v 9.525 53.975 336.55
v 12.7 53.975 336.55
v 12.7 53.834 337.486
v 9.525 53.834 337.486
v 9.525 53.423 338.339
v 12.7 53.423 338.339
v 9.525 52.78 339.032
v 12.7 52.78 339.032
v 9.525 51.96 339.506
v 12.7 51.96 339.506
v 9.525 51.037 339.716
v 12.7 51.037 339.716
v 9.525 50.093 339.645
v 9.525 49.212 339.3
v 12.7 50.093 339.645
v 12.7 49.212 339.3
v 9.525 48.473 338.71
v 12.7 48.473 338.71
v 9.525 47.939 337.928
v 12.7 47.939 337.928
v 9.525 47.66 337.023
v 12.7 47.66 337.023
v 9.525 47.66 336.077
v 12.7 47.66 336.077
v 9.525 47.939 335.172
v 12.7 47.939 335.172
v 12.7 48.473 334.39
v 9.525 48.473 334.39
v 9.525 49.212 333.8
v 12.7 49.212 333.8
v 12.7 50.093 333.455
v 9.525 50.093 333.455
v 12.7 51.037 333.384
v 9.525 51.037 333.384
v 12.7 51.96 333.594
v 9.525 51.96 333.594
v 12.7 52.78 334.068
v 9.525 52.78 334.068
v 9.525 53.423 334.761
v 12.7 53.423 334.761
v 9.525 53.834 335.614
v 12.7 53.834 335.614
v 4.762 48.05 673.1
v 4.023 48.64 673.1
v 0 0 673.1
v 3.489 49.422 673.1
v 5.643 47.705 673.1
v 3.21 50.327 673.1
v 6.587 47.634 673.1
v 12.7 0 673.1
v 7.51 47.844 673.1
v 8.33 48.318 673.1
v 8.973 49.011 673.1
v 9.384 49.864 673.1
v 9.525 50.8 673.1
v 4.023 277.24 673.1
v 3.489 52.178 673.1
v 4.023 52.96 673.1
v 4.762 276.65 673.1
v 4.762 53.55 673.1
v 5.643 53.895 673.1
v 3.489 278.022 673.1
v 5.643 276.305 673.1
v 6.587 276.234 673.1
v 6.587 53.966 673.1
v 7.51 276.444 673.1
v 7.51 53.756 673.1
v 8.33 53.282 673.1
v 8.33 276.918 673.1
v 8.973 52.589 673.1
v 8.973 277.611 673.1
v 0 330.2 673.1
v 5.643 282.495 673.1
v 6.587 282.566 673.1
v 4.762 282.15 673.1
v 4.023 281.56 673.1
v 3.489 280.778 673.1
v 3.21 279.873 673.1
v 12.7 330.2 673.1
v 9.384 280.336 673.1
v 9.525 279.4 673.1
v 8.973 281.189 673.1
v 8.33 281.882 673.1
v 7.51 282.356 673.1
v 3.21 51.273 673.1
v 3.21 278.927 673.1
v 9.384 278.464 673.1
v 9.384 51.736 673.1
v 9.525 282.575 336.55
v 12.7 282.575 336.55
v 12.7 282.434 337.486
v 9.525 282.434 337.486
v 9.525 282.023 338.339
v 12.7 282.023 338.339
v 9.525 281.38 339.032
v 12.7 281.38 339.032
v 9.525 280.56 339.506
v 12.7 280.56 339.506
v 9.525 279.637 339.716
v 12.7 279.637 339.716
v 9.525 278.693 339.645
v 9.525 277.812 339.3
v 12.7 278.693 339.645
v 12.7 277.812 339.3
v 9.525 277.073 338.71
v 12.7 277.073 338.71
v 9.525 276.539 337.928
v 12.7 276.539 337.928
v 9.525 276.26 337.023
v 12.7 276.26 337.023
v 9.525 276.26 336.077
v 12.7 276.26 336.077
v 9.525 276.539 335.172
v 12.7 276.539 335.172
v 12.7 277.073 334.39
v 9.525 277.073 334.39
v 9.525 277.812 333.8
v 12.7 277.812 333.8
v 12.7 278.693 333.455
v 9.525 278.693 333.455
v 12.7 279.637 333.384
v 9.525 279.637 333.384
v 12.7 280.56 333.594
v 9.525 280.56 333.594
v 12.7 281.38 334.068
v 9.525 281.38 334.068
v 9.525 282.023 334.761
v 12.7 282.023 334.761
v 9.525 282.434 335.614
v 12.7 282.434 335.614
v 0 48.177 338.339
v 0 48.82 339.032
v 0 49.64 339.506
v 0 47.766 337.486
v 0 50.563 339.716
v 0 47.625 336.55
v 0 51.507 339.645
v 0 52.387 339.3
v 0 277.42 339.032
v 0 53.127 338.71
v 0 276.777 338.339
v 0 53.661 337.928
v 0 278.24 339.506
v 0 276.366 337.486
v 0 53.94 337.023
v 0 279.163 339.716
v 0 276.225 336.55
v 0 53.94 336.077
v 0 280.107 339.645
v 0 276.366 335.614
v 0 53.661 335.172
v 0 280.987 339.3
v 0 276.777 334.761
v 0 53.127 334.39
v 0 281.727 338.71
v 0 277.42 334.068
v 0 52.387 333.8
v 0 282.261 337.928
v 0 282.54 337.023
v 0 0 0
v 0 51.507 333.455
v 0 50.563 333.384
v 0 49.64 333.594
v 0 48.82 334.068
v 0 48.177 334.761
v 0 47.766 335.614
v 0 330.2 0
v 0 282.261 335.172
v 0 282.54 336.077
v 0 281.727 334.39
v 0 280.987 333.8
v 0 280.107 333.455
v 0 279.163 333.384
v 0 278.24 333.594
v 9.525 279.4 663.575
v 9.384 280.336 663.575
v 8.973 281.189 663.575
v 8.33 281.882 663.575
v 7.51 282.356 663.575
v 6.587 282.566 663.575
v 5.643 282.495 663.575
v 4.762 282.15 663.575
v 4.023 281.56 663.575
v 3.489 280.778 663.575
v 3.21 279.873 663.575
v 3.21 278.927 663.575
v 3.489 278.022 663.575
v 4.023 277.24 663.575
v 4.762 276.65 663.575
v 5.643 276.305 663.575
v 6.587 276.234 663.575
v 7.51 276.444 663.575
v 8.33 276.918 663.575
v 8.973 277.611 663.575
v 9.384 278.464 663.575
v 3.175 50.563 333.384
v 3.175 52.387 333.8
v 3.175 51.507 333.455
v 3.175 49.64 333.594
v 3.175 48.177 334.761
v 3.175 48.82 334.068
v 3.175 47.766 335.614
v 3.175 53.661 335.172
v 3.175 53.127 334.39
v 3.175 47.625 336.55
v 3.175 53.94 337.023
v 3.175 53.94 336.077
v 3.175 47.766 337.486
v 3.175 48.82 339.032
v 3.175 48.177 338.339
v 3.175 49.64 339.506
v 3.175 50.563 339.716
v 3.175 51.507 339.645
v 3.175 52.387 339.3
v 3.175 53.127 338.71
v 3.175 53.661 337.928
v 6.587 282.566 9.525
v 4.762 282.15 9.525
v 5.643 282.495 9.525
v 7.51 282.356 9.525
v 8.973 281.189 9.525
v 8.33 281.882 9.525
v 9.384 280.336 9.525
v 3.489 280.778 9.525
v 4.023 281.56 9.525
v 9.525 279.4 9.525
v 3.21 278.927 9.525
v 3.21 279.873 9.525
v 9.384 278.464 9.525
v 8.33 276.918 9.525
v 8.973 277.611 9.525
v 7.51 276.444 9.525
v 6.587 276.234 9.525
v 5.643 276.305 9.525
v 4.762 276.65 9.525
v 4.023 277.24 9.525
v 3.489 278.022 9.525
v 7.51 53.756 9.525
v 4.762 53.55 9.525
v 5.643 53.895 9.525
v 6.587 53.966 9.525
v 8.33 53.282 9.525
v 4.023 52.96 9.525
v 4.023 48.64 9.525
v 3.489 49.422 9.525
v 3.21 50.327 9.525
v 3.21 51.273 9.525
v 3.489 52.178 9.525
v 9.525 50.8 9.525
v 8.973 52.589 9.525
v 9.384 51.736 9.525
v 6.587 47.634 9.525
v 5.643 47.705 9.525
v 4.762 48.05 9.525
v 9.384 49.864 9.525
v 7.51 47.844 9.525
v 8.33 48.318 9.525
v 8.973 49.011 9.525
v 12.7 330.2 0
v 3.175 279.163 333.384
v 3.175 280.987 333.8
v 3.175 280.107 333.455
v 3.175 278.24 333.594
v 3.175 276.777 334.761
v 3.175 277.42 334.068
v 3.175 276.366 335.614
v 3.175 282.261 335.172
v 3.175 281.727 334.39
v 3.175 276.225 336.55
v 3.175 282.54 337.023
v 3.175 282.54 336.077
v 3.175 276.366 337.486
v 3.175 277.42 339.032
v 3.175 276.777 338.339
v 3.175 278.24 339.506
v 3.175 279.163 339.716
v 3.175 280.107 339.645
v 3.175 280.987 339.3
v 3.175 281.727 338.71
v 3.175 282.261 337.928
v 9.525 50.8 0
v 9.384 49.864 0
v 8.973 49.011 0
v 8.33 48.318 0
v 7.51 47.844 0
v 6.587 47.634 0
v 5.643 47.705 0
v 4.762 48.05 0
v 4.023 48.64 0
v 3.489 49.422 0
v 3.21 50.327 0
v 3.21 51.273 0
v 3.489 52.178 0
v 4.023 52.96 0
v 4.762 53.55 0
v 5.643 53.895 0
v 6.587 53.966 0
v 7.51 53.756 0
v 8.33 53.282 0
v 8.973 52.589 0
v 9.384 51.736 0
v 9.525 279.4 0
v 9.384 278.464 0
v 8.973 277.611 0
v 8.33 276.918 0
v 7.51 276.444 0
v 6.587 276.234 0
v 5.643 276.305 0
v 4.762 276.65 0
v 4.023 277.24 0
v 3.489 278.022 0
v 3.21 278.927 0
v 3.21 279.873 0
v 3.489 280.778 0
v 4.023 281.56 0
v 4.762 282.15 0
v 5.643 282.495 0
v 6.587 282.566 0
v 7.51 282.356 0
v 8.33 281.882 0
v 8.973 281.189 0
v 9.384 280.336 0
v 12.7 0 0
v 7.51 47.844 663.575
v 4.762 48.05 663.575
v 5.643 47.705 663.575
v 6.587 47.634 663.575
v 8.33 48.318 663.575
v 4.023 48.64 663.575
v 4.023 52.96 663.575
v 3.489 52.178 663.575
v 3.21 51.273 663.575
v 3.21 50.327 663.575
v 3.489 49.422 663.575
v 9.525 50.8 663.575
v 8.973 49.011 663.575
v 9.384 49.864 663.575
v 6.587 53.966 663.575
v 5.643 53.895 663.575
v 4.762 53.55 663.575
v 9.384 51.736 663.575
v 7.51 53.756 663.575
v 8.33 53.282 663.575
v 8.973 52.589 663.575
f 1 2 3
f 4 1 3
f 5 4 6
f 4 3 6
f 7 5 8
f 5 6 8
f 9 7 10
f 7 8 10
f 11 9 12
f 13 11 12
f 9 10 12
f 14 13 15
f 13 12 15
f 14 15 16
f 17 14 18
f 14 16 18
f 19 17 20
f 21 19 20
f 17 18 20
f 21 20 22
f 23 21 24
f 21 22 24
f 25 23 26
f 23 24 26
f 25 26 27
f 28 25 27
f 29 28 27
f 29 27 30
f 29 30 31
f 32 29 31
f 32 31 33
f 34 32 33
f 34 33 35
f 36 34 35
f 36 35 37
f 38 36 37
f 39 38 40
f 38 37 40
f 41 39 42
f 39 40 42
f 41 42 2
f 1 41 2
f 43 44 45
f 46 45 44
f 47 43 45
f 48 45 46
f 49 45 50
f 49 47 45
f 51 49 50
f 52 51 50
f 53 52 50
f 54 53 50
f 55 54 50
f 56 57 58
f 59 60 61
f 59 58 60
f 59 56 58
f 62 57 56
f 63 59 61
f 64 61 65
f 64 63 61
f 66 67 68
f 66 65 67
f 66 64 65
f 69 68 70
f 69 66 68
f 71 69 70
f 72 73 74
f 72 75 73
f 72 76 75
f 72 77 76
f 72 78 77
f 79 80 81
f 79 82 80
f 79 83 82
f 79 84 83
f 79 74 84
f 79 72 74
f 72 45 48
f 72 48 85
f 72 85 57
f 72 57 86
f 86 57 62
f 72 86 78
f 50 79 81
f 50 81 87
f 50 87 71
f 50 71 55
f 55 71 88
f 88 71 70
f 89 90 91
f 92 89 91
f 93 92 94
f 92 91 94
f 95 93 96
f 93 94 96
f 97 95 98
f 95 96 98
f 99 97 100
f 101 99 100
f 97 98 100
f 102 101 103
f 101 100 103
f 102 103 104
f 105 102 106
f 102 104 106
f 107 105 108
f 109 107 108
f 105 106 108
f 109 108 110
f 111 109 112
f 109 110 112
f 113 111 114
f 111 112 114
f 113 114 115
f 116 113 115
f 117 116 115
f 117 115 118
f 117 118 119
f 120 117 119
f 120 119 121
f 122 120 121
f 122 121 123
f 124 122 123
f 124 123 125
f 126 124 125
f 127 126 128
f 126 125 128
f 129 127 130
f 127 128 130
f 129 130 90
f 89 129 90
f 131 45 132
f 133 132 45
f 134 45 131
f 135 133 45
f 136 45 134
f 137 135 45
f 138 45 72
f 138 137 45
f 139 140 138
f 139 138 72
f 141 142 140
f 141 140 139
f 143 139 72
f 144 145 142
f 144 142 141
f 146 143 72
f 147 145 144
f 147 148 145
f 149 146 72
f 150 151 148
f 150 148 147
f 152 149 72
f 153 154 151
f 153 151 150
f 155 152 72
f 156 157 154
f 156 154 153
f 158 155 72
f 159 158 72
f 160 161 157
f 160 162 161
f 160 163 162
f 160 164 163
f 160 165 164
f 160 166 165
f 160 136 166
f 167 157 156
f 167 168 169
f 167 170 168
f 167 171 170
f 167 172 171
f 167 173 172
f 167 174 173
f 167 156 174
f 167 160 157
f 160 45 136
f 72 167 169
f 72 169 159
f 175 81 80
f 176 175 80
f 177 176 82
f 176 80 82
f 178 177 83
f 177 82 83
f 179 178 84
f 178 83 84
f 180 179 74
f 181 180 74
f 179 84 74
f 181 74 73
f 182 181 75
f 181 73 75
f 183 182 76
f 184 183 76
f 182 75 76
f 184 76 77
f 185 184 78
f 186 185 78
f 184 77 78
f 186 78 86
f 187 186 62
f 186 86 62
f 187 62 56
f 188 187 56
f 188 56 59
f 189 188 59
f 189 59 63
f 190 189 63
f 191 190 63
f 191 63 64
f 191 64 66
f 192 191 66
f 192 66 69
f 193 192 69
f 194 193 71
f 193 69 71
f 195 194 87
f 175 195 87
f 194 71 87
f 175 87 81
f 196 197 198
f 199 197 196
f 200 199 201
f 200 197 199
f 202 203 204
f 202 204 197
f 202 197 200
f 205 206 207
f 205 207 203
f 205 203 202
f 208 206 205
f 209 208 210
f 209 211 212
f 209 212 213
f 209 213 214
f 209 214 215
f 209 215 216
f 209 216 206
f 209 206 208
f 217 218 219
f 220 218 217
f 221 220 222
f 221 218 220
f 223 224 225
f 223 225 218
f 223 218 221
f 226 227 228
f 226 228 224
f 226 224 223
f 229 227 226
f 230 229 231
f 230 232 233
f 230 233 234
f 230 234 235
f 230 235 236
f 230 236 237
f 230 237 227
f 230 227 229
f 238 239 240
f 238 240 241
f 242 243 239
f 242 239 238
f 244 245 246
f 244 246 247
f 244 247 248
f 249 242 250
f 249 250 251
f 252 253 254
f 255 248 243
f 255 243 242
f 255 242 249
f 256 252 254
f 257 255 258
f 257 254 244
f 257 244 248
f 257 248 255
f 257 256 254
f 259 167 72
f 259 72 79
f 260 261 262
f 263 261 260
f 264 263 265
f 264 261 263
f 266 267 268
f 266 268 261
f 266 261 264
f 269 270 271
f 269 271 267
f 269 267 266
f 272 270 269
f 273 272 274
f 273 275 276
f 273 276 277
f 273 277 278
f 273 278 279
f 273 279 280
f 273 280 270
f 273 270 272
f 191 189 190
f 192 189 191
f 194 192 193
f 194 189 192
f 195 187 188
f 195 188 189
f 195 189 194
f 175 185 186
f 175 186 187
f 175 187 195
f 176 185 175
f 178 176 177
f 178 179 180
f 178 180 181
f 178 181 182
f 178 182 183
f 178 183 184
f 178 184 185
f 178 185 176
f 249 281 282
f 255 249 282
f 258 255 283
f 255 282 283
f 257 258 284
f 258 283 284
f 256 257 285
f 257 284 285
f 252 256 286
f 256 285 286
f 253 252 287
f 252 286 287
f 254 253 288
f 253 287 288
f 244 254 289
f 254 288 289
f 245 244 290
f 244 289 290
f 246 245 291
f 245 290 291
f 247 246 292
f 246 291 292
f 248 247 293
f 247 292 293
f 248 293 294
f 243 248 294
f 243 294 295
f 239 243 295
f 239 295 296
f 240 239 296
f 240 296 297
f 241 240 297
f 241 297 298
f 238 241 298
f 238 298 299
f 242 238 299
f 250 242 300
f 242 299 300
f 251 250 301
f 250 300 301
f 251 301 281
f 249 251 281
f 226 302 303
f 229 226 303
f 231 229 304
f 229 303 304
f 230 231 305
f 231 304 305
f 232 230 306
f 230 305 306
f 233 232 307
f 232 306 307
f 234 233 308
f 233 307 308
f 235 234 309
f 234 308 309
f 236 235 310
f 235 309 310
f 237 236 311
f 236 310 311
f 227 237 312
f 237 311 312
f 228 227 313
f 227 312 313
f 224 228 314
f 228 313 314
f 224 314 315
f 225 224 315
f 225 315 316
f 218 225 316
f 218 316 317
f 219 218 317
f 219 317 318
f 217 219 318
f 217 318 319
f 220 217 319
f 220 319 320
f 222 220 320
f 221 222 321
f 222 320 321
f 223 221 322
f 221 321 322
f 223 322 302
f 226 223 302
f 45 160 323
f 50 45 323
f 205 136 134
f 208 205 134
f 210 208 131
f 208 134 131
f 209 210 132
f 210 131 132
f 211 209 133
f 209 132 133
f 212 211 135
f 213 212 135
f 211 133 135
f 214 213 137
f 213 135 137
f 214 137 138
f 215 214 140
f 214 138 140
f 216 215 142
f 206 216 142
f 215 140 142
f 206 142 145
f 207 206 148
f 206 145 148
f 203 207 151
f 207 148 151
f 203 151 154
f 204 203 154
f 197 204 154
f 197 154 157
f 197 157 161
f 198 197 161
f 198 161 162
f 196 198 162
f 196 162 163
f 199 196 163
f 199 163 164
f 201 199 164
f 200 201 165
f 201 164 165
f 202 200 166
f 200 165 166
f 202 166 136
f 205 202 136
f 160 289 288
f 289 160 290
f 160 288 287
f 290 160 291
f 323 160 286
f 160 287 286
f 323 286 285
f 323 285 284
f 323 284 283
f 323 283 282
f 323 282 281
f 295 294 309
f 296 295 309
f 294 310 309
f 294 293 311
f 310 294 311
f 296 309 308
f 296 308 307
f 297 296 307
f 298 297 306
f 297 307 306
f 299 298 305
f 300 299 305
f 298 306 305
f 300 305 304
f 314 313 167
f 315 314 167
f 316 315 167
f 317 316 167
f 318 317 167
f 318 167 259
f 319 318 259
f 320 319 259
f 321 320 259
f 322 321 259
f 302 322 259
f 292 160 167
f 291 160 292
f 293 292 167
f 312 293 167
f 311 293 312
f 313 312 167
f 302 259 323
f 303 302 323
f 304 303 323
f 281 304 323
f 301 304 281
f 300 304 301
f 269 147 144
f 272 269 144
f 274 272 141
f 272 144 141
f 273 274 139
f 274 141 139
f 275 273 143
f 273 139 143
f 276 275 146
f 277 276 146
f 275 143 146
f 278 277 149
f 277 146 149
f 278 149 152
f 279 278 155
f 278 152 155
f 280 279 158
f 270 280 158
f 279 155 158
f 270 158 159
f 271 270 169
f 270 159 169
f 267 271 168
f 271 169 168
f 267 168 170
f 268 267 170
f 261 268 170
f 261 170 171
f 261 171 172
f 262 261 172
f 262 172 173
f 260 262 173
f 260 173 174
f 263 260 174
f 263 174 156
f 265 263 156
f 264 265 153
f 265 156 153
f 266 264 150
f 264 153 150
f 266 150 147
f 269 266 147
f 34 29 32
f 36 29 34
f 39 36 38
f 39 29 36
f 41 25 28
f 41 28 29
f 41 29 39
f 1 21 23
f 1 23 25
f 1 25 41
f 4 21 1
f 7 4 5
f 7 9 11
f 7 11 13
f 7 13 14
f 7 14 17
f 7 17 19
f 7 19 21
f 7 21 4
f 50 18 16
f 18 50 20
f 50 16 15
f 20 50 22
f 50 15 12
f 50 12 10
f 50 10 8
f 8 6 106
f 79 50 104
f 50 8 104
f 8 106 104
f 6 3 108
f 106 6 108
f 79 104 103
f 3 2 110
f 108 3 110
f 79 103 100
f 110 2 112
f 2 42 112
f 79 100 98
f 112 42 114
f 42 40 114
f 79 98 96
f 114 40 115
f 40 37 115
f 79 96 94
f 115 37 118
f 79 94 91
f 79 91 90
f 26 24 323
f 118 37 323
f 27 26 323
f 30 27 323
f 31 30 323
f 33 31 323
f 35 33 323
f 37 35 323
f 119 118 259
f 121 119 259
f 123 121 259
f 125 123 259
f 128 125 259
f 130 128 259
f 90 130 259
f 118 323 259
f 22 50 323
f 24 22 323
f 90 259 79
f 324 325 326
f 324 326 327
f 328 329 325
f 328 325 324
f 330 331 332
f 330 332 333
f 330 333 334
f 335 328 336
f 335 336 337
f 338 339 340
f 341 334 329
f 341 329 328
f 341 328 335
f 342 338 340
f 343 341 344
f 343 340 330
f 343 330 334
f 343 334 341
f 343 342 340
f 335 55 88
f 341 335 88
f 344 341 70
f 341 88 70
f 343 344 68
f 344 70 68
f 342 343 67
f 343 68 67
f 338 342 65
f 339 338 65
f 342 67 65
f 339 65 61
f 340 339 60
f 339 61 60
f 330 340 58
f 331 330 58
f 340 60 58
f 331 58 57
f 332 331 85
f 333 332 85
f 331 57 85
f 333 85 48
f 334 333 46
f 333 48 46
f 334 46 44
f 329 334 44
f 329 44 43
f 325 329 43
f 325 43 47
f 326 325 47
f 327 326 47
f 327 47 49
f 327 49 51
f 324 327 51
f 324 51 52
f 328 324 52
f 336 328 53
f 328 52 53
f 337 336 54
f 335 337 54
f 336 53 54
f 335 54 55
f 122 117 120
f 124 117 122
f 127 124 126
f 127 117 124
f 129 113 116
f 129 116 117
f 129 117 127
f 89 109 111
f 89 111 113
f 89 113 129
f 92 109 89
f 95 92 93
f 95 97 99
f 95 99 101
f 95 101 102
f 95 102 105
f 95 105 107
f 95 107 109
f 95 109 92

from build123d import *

# Parameters (mm, degrees)
F0_W     = 12.7
F0_H     = 330.2
F1_DEPTH = 673.1
F2_R     = 3.175
F3_DEPTH = 9.525
F4_R     = 3.175
F5_DEPTH = 9.525
F6_R     = 3.175
F8_DEPTH = 3.175
F7_R     = 3.175
F9_DEPTH = 3.175


with BuildPart() as f1:
    # F0 (on Top) → F1 (new body)
    with BuildSketch(Plane.XY):
        with Locations((6.35, 165.1)):
            Rectangle(F0_W, F0_H)
    extrude(amount=F1_DEPTH)

    # F2 (on face) → F3 (cut)
    with BuildSketch(Plane(origin=(0, 0, 0), x_dir=(1, 0, 0), z_dir=(0, 0, -1))):
        with Locations((6.35, -50.8)):
            Circle(F2_R)
        with Locations((6.35, -279.4)):
            Circle(F2_R)
    extrude(amount=-F3_DEPTH, mode=Mode.SUBTRACT)

    # F4 (on face) → F5 (cut)
    with BuildSketch(Plane.XY.offset(673.1)):
        with Locations((6.35, 279.4)):
            Circle(F4_R)
        with Locations((6.35, 50.8)):
            Circle(F4_R)
    extrude(amount=-F5_DEPTH, mode=Mode.SUBTRACT)

    # F6 (on face) → F8 (cut)
    with BuildSketch(Plane(origin=(0, 0, 0), x_dir=(0, -1, 0), z_dir=(-1, 0, 0))):
        with Locations((-279.4, 336.55)):
            Circle(F6_R)
        with Locations((-50.8, 336.55)):
            Circle(F6_R)
    extrude(amount=-F8_DEPTH, mode=Mode.SUBTRACT)

    # F7 (on face) → F9 (cut)
    with BuildSketch(Plane.YZ.offset(12.7)):
        with Locations((50.8, 336.55)):
            Circle(F7_R)
        with Locations((279.4, 336.55)):
            Circle(F7_R)
    extrude(amount=-F9_DEPTH, mode=Mode.SUBTRACT)


solid = f1.part
